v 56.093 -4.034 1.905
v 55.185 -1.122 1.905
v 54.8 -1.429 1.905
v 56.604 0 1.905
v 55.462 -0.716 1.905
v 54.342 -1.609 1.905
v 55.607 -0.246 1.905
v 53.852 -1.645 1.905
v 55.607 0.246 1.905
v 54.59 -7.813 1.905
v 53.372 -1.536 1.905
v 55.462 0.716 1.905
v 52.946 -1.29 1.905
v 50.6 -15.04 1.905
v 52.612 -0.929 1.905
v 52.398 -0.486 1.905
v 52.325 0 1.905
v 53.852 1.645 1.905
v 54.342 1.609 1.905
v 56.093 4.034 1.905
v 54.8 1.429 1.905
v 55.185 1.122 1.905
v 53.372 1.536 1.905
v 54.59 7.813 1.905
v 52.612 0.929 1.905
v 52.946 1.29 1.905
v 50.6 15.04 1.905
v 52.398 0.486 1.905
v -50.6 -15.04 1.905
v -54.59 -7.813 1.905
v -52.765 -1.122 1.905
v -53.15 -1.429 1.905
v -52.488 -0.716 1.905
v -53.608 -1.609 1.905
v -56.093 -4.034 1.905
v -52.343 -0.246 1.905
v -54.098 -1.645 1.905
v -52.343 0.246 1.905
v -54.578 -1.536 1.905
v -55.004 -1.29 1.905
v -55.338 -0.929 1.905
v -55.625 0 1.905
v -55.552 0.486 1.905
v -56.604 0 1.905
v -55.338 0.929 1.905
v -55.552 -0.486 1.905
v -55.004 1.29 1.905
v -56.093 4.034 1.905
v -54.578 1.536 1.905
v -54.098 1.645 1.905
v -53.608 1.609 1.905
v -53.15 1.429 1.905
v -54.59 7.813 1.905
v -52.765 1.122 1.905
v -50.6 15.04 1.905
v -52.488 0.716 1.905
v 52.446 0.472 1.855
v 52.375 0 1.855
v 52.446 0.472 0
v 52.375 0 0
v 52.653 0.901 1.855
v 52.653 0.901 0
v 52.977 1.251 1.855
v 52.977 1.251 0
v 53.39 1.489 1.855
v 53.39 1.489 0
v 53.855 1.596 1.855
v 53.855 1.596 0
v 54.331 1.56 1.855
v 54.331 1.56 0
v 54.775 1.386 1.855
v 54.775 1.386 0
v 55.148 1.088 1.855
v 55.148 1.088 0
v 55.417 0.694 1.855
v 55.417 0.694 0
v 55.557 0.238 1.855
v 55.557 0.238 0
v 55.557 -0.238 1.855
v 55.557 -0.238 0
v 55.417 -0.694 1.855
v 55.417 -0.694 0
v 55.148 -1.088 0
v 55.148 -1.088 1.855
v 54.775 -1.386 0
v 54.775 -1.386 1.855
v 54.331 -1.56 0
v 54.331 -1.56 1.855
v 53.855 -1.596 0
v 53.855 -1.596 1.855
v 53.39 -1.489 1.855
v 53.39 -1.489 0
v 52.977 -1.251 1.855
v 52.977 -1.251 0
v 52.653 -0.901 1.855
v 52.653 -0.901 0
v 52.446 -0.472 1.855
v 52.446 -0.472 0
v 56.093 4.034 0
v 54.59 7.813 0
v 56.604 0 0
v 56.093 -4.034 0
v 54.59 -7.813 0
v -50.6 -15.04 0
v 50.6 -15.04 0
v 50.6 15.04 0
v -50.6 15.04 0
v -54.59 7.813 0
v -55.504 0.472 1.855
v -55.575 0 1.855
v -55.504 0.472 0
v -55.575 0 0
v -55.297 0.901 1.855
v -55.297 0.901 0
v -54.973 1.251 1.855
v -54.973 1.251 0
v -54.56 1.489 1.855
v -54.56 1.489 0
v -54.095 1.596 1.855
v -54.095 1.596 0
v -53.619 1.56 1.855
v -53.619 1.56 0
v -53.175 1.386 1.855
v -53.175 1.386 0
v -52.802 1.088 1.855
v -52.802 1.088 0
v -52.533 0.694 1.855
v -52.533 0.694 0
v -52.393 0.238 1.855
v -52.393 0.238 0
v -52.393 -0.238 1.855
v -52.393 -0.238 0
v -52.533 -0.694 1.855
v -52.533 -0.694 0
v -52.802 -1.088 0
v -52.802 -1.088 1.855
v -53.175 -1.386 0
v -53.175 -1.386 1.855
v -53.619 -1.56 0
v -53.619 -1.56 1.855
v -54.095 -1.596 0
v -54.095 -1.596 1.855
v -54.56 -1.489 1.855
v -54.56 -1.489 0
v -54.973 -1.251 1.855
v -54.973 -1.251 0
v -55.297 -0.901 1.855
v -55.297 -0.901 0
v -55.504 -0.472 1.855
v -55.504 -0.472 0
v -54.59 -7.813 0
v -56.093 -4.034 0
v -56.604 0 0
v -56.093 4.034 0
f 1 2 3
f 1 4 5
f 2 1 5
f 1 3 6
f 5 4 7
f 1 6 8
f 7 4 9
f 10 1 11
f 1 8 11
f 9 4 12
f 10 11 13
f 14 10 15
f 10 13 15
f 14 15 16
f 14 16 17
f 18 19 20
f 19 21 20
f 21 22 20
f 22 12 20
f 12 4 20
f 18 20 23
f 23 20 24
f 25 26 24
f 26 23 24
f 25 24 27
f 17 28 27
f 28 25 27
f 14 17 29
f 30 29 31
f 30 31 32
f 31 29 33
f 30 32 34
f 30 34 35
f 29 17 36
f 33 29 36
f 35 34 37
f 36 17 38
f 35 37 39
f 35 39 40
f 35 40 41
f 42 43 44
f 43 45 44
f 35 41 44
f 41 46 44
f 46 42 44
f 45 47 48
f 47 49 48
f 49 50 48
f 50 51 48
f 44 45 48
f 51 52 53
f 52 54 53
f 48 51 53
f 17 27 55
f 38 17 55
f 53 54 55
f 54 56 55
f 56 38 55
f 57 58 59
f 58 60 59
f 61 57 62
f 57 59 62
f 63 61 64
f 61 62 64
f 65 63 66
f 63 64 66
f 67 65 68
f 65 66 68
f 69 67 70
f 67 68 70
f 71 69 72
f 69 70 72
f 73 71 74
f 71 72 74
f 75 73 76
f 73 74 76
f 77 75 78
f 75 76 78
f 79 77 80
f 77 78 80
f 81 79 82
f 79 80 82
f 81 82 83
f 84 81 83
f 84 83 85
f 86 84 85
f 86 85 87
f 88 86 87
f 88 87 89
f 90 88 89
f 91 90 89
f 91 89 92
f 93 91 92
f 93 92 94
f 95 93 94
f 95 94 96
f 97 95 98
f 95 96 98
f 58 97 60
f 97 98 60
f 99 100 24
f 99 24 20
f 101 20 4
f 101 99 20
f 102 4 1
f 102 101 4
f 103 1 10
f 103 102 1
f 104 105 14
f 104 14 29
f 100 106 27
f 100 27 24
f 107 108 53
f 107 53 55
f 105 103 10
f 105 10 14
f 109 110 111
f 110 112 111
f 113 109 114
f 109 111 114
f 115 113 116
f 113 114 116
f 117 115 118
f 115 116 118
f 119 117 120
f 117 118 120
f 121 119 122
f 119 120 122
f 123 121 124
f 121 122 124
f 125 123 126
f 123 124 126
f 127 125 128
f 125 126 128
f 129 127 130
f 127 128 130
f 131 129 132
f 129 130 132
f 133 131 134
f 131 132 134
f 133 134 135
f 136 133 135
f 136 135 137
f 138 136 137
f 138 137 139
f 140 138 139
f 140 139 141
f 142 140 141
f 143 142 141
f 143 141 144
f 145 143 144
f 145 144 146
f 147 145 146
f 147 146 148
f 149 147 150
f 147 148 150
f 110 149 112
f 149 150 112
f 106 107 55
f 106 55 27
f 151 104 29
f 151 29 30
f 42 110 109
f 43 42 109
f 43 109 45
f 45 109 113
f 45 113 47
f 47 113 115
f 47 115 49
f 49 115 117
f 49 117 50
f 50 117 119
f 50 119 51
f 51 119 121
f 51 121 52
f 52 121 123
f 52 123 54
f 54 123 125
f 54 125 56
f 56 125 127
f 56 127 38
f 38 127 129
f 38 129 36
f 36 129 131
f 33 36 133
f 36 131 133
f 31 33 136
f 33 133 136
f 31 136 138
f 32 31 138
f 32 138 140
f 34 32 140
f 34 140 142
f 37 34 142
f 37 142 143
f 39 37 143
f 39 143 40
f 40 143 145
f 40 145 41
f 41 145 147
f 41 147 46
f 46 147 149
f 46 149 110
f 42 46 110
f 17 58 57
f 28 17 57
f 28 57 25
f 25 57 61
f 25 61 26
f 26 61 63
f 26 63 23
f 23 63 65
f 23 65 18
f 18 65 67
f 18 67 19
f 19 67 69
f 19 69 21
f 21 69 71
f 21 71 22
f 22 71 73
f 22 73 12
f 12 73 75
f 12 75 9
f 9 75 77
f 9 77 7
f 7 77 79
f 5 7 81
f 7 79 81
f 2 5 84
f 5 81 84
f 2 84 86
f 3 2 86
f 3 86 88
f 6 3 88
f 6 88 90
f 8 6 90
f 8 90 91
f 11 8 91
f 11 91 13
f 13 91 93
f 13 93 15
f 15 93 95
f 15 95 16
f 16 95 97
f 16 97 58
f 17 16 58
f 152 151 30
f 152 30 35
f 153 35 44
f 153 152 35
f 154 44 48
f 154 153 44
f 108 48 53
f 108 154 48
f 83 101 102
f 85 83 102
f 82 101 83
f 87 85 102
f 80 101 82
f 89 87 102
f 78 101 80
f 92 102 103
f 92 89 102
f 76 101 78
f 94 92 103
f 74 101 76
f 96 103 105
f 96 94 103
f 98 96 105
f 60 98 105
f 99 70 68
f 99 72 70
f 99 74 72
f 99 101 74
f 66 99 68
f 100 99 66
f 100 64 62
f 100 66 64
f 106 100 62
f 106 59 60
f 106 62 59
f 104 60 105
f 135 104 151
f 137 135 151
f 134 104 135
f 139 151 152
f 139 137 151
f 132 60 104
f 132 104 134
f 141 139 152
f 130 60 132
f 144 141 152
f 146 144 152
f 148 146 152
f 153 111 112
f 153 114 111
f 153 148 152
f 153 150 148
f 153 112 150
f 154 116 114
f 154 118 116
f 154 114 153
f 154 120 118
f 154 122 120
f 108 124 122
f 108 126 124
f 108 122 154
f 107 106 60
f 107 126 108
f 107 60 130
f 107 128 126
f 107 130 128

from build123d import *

# Parameters (mm, degrees)
BOSS_EXTRUDE1_DEPTH             = 1.905
F_3_0MM_DOWEL_HOLE1_D           = 3.2
F_3_0MM_DOWEL_HOLE1_CSINK_D     = 3.3
F_3_0MM_DOWEL_HOLE1_CSINK_ANGLE = 90


with BuildPart() as part:
    # Sketch1 → Boss-Extrude1 (new body)
    with BuildSketch(Plane.XY):
        with BuildLine():
            Line((-50.6, 15.04), (50.6, 15.04))
            Line((50.6, 15.04), (54.590317598, 7.813493896))
            ThreePointArc((54.590317598, 7.813493896), (56.604225159, 0), (54.590317598, -7.813493896))
            Line((54.590317598, -7.813493896), (50.6, -15.04))
            Line((50.6, -15.04), (-50.6, -15.04))
            Line((-50.6, -15.04), (-54.590317598, -7.813493896))
            ThreePointArc((-54.590317598, -7.813493896), (-56.604225159, 0), (-54.590317598, 7.813493896))
            Line((-54.590317598, 7.813493896), (-50.6, 15.04))
        make_face()
    extrude(amount=BOSS_EXTRUDE1_DEPTH)

    # Ø3.0mm Dowel Hole1 (through all)
    with Locations(Plane.XY.offset(1.905)):
        with Locations((53.975, 0), (-53.975, 0)):
            CounterSinkHole(F_3_0MM_DOWEL_HOLE1_D / 2, F_3_0MM_DOWEL_HOLE1_CSINK_D / 2, counter_sink_angle=F_3_0MM_DOWEL_HOLE1_CSINK_ANGLE)


solid = part.part
